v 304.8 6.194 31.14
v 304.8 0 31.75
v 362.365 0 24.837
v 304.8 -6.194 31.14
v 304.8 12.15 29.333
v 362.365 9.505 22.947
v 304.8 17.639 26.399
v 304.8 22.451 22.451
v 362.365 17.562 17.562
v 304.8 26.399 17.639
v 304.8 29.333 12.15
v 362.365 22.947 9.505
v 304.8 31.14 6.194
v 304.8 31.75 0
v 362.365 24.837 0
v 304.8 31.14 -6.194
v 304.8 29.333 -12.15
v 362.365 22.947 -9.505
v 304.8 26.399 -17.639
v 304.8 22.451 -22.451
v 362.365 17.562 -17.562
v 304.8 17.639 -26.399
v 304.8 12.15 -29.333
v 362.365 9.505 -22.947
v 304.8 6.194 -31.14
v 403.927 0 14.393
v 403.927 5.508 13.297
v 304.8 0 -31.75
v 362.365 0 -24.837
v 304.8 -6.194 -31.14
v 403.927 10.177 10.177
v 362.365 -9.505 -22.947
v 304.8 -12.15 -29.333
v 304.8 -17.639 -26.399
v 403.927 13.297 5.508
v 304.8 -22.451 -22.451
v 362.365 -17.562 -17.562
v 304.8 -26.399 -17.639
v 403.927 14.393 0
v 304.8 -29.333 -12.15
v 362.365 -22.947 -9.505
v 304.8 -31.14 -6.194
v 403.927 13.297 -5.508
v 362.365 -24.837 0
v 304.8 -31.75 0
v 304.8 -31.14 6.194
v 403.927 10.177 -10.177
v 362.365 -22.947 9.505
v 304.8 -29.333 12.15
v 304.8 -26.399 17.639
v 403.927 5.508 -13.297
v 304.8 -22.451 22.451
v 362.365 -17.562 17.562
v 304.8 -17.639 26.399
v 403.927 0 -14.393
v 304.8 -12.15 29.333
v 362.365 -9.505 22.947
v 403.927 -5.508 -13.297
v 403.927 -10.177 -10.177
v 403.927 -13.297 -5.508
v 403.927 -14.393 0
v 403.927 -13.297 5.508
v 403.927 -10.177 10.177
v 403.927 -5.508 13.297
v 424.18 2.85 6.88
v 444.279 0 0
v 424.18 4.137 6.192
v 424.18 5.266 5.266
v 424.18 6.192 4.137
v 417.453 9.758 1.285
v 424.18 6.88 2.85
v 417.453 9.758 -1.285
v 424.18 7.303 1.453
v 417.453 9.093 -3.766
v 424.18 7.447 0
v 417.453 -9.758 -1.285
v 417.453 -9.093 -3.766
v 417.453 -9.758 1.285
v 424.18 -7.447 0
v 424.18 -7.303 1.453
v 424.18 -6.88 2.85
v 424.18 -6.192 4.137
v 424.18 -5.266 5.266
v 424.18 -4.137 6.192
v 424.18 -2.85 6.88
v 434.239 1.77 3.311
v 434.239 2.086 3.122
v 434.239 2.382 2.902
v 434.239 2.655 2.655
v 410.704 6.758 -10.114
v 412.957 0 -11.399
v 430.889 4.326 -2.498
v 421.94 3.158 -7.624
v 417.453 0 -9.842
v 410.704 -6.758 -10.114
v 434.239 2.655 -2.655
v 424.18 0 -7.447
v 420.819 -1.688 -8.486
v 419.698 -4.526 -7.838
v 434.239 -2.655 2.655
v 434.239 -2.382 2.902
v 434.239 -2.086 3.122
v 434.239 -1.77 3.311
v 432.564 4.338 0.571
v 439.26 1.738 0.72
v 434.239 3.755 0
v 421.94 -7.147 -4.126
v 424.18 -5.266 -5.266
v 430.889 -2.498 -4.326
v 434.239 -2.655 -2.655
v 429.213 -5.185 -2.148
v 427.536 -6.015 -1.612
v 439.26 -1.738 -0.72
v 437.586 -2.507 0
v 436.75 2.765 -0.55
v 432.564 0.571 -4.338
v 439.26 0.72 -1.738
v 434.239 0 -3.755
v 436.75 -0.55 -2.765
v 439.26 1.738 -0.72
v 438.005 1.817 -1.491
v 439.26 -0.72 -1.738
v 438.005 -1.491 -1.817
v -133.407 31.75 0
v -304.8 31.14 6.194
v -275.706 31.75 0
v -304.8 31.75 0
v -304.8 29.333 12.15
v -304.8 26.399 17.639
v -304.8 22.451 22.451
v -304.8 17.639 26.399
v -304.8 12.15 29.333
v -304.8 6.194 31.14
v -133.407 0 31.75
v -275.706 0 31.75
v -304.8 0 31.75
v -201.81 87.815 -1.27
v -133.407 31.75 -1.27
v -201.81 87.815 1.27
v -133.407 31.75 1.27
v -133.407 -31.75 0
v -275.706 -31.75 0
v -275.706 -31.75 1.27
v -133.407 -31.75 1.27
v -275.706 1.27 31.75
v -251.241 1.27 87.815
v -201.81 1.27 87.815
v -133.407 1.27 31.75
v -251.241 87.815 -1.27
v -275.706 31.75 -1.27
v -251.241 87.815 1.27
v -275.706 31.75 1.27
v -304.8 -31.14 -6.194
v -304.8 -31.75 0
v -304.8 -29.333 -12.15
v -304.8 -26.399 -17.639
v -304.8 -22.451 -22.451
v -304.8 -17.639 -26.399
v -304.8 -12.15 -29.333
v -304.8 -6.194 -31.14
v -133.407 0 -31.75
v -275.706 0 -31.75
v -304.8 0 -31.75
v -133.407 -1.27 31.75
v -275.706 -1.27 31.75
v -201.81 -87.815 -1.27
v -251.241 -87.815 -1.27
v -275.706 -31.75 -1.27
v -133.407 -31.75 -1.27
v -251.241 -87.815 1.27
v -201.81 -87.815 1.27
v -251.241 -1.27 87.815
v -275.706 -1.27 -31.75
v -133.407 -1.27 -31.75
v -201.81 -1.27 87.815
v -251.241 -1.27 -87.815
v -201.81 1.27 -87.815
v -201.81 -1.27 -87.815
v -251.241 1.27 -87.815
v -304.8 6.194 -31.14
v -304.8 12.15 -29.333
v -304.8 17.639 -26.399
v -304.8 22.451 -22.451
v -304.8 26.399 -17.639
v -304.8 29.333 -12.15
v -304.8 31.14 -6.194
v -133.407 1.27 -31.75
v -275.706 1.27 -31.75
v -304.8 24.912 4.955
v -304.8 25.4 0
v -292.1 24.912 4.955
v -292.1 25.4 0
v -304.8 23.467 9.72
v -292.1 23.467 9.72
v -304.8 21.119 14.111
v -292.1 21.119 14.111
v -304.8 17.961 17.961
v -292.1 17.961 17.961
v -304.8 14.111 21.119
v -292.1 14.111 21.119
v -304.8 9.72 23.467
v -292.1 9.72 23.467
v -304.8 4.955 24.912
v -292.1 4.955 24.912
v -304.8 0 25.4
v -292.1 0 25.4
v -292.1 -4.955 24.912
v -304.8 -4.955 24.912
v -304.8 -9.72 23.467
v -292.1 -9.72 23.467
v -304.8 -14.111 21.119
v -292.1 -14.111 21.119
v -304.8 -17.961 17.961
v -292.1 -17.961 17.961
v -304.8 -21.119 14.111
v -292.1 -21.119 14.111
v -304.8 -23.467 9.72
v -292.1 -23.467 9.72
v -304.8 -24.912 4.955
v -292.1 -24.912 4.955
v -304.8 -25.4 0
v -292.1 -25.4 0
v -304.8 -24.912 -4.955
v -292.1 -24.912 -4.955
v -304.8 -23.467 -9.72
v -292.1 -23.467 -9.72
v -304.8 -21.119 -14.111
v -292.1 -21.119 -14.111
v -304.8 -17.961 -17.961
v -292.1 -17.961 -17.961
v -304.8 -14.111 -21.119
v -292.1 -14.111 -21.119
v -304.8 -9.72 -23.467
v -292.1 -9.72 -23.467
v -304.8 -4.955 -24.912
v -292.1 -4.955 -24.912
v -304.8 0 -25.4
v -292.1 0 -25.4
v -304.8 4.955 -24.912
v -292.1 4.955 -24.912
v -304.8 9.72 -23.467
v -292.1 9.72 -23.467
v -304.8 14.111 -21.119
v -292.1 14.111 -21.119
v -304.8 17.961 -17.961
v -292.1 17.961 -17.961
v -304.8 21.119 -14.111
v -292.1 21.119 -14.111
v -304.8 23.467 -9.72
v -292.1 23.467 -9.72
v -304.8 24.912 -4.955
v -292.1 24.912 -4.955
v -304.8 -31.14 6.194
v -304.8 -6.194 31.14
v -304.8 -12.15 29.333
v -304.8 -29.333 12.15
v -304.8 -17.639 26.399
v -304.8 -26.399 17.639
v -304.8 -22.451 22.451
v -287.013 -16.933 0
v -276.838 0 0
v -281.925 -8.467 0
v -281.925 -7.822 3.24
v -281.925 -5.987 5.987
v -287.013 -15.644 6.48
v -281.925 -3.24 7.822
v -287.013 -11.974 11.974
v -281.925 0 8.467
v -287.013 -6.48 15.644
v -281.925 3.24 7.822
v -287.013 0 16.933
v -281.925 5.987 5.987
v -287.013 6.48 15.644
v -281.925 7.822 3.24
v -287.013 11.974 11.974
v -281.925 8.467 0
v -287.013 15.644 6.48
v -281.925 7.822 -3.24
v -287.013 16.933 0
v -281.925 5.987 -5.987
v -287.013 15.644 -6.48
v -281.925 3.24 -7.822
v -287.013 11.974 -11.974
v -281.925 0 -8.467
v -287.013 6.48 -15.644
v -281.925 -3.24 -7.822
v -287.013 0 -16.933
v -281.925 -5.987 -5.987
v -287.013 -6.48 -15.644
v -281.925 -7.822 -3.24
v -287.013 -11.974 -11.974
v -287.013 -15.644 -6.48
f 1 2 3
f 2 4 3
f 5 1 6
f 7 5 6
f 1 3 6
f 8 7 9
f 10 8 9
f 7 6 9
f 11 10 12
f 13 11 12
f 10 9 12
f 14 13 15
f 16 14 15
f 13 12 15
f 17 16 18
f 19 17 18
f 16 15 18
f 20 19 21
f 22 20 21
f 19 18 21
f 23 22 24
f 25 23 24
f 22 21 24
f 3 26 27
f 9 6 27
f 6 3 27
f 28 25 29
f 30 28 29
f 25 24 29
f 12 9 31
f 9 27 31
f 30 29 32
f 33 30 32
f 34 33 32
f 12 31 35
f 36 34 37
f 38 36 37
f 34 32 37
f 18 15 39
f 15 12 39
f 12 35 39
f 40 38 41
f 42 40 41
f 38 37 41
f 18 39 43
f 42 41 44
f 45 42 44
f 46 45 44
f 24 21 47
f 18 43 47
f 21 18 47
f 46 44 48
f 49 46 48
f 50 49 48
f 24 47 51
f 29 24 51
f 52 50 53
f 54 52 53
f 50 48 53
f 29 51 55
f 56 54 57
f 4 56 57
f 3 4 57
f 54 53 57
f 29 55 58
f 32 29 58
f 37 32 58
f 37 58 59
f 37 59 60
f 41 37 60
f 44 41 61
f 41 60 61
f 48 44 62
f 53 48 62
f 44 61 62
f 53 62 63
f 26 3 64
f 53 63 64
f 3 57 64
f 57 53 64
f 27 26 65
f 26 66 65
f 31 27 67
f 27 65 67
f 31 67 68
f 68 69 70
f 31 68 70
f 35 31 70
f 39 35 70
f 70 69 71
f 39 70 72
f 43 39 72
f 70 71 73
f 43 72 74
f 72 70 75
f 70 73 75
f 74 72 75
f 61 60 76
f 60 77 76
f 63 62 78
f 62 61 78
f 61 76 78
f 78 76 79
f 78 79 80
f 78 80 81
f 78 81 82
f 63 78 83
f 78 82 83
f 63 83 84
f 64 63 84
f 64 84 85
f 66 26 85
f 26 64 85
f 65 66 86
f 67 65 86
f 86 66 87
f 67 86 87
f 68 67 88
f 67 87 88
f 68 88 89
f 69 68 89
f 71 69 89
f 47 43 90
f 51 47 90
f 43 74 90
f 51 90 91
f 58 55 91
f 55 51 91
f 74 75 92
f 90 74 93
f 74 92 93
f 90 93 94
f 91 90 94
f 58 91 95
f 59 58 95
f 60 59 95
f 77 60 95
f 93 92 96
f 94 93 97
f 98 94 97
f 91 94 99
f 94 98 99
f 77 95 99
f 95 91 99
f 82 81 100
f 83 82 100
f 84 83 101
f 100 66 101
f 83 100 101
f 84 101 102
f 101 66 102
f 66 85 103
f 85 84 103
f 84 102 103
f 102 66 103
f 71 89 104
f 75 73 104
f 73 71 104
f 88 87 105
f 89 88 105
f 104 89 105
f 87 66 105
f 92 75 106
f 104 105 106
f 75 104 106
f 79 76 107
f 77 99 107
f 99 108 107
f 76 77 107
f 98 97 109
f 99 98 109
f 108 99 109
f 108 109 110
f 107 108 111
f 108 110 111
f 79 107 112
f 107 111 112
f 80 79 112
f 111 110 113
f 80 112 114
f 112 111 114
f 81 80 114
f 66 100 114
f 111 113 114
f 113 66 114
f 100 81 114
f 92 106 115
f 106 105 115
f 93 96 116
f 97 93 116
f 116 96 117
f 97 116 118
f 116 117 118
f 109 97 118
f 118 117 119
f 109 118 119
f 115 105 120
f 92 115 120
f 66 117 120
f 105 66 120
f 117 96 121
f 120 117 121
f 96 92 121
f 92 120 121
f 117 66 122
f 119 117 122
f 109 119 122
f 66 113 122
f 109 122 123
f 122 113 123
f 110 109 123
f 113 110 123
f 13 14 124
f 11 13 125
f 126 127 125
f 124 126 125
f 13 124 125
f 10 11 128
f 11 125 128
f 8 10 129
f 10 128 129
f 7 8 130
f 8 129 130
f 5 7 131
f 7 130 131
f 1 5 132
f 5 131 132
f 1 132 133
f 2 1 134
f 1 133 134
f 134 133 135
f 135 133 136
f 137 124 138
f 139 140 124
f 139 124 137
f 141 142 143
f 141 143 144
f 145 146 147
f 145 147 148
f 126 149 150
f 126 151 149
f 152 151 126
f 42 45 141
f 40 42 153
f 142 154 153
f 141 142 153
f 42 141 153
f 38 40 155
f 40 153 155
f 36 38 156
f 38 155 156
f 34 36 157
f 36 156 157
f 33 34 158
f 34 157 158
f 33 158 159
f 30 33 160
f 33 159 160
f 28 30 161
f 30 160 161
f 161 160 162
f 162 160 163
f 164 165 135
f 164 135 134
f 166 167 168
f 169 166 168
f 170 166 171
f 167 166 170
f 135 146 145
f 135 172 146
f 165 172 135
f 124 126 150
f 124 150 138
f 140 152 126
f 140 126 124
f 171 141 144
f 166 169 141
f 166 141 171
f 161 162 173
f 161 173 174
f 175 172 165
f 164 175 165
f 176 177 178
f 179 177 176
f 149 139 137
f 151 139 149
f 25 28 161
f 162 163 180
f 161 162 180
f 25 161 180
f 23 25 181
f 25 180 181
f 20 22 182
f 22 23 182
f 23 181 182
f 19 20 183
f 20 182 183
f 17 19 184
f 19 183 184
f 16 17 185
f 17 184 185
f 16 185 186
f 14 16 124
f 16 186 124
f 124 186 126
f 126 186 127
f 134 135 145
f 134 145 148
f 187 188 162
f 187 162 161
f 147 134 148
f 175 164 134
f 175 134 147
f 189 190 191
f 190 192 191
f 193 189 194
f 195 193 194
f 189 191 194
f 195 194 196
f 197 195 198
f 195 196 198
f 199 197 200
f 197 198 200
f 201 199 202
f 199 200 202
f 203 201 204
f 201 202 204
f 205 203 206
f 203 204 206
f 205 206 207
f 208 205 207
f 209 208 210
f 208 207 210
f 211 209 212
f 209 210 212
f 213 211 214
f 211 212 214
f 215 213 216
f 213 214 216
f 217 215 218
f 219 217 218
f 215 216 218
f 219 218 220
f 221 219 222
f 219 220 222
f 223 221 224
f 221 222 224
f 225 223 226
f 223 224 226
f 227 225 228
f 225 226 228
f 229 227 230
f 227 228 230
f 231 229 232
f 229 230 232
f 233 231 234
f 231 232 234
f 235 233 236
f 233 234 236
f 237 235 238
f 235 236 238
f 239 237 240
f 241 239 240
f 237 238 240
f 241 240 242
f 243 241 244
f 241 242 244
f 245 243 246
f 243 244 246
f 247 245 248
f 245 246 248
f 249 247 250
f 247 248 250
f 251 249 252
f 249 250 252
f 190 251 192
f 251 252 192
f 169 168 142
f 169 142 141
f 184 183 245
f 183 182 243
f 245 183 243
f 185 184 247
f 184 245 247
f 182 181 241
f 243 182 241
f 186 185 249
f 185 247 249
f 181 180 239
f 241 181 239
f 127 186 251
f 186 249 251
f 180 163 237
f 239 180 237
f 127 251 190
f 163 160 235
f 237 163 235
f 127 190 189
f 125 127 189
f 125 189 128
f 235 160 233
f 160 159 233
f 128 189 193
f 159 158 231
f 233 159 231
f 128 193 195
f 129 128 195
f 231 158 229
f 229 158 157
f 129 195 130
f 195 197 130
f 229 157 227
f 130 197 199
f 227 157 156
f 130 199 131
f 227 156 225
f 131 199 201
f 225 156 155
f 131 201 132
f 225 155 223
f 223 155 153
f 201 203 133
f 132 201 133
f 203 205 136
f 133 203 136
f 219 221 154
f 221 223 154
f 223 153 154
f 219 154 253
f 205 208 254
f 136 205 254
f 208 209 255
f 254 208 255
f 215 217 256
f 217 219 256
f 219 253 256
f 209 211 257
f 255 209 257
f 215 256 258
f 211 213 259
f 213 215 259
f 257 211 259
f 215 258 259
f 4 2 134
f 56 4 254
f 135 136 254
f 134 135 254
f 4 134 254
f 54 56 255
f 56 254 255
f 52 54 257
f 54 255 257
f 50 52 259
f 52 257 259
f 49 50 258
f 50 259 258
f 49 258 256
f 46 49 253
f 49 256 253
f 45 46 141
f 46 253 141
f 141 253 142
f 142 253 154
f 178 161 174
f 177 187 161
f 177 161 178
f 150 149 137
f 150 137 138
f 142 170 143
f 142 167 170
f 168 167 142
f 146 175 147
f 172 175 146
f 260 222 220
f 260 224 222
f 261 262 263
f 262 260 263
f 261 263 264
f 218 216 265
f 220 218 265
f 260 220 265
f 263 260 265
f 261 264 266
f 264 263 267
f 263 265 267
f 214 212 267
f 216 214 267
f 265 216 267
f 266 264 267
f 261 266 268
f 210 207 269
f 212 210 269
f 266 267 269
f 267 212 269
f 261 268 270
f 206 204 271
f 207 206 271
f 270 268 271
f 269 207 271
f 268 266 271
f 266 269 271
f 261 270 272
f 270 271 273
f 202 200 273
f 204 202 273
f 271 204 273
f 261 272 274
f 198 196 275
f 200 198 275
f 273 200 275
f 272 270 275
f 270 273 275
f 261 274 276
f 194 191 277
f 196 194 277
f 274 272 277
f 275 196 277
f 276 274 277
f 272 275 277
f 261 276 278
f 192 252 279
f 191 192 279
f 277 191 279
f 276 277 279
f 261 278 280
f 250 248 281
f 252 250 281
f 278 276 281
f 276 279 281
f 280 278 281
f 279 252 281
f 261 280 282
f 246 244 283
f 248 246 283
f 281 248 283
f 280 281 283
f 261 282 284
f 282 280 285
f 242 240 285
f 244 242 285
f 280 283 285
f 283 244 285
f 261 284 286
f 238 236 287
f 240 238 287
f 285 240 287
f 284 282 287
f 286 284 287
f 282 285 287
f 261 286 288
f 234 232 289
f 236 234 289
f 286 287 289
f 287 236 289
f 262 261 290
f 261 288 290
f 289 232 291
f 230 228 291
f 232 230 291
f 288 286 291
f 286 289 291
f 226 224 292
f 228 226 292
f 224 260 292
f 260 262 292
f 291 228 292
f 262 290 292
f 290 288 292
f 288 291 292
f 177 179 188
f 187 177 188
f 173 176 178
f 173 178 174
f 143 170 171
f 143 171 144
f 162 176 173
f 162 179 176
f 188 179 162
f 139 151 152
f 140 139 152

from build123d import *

# Parameters (mm, degrees)
F3_DEPTH = 1.27
F4_COUNT = 4
F6_D     = 50.8
F6_DEPTH = 12.7
F6_TIP   = 15.2618597233


with BuildPart() as f1:
    # F0 (on Front) → F1 (revolve)
    with BuildSketch(Plane.XZ):
        with BuildLine():
            Line((304.8, 31.75), (304.8, 0))
            Line((304.8, 0), (444.2785084248, 0))
            add(Edge.make_bspline(
                [(304.8, 31.75), (329.1421490587, 29.5054806716), (377.5121094621, 25.0454261884), (422.119671216, 8.3122278624), (444.2785084248, 0)],
                knots=[0, 0, 0, 0, 0.5032493071, 1, 1, 1, 1], degree=3))
        make_face()
    revolve(axis=Axis((374.5392542124, 0, 0), (-1, 0, 0)))

    # F0 (on Front) → F2 (revolve)
    with BuildSketch(Plane.XZ):
        Polygon((-275.7061719894, 31.75), (-304.8, 31.75), (-304.8, 0), (304.8, 0), (304.8, 31.75), (-133.4068477154, 31.75), align=None)
    revolve(axis=Axis((0, 0, 0), (1, 0, 0)))

    # F0 (on Front) → F3 (join, symmetric)
    with BuildSketch(Plane.XZ):
        Polygon((-251.240670681, 87.8152102232), (-275.7061719894, 31.75), (-133.4068477154, 31.75), (-201.8103897572, 87.8152102232), align=None)
    extrude(amount=F3_DEPTH, both=True)

    # F4: F1 ×4 about axis
    f4_axis = Axis((0, 0, 0), (1, 0, 0))


with BuildPart() as f1_1:
    add(f1.part)
    for i in range(1, F4_COUNT):
        add(f1.part.rotate(f4_axis, i * 360 / F4_COUNT))

    # F6
    with Locations(Plane(origin=(-304.8, 0, 0), x_dir=(0, -1, 0), z_dir=(-1, 0, 0))):
        with Locations((0, 0)):
            Hole(F6_D / 2, depth=F6_DEPTH)
            with Locations((0, 0, -(F6_DEPTH + F6_TIP / 2))):  # 118° drill point
                Cone(0, F6_D / 2, F6_TIP, mode=Mode.SUBTRACT)


solid = f1_1.part
